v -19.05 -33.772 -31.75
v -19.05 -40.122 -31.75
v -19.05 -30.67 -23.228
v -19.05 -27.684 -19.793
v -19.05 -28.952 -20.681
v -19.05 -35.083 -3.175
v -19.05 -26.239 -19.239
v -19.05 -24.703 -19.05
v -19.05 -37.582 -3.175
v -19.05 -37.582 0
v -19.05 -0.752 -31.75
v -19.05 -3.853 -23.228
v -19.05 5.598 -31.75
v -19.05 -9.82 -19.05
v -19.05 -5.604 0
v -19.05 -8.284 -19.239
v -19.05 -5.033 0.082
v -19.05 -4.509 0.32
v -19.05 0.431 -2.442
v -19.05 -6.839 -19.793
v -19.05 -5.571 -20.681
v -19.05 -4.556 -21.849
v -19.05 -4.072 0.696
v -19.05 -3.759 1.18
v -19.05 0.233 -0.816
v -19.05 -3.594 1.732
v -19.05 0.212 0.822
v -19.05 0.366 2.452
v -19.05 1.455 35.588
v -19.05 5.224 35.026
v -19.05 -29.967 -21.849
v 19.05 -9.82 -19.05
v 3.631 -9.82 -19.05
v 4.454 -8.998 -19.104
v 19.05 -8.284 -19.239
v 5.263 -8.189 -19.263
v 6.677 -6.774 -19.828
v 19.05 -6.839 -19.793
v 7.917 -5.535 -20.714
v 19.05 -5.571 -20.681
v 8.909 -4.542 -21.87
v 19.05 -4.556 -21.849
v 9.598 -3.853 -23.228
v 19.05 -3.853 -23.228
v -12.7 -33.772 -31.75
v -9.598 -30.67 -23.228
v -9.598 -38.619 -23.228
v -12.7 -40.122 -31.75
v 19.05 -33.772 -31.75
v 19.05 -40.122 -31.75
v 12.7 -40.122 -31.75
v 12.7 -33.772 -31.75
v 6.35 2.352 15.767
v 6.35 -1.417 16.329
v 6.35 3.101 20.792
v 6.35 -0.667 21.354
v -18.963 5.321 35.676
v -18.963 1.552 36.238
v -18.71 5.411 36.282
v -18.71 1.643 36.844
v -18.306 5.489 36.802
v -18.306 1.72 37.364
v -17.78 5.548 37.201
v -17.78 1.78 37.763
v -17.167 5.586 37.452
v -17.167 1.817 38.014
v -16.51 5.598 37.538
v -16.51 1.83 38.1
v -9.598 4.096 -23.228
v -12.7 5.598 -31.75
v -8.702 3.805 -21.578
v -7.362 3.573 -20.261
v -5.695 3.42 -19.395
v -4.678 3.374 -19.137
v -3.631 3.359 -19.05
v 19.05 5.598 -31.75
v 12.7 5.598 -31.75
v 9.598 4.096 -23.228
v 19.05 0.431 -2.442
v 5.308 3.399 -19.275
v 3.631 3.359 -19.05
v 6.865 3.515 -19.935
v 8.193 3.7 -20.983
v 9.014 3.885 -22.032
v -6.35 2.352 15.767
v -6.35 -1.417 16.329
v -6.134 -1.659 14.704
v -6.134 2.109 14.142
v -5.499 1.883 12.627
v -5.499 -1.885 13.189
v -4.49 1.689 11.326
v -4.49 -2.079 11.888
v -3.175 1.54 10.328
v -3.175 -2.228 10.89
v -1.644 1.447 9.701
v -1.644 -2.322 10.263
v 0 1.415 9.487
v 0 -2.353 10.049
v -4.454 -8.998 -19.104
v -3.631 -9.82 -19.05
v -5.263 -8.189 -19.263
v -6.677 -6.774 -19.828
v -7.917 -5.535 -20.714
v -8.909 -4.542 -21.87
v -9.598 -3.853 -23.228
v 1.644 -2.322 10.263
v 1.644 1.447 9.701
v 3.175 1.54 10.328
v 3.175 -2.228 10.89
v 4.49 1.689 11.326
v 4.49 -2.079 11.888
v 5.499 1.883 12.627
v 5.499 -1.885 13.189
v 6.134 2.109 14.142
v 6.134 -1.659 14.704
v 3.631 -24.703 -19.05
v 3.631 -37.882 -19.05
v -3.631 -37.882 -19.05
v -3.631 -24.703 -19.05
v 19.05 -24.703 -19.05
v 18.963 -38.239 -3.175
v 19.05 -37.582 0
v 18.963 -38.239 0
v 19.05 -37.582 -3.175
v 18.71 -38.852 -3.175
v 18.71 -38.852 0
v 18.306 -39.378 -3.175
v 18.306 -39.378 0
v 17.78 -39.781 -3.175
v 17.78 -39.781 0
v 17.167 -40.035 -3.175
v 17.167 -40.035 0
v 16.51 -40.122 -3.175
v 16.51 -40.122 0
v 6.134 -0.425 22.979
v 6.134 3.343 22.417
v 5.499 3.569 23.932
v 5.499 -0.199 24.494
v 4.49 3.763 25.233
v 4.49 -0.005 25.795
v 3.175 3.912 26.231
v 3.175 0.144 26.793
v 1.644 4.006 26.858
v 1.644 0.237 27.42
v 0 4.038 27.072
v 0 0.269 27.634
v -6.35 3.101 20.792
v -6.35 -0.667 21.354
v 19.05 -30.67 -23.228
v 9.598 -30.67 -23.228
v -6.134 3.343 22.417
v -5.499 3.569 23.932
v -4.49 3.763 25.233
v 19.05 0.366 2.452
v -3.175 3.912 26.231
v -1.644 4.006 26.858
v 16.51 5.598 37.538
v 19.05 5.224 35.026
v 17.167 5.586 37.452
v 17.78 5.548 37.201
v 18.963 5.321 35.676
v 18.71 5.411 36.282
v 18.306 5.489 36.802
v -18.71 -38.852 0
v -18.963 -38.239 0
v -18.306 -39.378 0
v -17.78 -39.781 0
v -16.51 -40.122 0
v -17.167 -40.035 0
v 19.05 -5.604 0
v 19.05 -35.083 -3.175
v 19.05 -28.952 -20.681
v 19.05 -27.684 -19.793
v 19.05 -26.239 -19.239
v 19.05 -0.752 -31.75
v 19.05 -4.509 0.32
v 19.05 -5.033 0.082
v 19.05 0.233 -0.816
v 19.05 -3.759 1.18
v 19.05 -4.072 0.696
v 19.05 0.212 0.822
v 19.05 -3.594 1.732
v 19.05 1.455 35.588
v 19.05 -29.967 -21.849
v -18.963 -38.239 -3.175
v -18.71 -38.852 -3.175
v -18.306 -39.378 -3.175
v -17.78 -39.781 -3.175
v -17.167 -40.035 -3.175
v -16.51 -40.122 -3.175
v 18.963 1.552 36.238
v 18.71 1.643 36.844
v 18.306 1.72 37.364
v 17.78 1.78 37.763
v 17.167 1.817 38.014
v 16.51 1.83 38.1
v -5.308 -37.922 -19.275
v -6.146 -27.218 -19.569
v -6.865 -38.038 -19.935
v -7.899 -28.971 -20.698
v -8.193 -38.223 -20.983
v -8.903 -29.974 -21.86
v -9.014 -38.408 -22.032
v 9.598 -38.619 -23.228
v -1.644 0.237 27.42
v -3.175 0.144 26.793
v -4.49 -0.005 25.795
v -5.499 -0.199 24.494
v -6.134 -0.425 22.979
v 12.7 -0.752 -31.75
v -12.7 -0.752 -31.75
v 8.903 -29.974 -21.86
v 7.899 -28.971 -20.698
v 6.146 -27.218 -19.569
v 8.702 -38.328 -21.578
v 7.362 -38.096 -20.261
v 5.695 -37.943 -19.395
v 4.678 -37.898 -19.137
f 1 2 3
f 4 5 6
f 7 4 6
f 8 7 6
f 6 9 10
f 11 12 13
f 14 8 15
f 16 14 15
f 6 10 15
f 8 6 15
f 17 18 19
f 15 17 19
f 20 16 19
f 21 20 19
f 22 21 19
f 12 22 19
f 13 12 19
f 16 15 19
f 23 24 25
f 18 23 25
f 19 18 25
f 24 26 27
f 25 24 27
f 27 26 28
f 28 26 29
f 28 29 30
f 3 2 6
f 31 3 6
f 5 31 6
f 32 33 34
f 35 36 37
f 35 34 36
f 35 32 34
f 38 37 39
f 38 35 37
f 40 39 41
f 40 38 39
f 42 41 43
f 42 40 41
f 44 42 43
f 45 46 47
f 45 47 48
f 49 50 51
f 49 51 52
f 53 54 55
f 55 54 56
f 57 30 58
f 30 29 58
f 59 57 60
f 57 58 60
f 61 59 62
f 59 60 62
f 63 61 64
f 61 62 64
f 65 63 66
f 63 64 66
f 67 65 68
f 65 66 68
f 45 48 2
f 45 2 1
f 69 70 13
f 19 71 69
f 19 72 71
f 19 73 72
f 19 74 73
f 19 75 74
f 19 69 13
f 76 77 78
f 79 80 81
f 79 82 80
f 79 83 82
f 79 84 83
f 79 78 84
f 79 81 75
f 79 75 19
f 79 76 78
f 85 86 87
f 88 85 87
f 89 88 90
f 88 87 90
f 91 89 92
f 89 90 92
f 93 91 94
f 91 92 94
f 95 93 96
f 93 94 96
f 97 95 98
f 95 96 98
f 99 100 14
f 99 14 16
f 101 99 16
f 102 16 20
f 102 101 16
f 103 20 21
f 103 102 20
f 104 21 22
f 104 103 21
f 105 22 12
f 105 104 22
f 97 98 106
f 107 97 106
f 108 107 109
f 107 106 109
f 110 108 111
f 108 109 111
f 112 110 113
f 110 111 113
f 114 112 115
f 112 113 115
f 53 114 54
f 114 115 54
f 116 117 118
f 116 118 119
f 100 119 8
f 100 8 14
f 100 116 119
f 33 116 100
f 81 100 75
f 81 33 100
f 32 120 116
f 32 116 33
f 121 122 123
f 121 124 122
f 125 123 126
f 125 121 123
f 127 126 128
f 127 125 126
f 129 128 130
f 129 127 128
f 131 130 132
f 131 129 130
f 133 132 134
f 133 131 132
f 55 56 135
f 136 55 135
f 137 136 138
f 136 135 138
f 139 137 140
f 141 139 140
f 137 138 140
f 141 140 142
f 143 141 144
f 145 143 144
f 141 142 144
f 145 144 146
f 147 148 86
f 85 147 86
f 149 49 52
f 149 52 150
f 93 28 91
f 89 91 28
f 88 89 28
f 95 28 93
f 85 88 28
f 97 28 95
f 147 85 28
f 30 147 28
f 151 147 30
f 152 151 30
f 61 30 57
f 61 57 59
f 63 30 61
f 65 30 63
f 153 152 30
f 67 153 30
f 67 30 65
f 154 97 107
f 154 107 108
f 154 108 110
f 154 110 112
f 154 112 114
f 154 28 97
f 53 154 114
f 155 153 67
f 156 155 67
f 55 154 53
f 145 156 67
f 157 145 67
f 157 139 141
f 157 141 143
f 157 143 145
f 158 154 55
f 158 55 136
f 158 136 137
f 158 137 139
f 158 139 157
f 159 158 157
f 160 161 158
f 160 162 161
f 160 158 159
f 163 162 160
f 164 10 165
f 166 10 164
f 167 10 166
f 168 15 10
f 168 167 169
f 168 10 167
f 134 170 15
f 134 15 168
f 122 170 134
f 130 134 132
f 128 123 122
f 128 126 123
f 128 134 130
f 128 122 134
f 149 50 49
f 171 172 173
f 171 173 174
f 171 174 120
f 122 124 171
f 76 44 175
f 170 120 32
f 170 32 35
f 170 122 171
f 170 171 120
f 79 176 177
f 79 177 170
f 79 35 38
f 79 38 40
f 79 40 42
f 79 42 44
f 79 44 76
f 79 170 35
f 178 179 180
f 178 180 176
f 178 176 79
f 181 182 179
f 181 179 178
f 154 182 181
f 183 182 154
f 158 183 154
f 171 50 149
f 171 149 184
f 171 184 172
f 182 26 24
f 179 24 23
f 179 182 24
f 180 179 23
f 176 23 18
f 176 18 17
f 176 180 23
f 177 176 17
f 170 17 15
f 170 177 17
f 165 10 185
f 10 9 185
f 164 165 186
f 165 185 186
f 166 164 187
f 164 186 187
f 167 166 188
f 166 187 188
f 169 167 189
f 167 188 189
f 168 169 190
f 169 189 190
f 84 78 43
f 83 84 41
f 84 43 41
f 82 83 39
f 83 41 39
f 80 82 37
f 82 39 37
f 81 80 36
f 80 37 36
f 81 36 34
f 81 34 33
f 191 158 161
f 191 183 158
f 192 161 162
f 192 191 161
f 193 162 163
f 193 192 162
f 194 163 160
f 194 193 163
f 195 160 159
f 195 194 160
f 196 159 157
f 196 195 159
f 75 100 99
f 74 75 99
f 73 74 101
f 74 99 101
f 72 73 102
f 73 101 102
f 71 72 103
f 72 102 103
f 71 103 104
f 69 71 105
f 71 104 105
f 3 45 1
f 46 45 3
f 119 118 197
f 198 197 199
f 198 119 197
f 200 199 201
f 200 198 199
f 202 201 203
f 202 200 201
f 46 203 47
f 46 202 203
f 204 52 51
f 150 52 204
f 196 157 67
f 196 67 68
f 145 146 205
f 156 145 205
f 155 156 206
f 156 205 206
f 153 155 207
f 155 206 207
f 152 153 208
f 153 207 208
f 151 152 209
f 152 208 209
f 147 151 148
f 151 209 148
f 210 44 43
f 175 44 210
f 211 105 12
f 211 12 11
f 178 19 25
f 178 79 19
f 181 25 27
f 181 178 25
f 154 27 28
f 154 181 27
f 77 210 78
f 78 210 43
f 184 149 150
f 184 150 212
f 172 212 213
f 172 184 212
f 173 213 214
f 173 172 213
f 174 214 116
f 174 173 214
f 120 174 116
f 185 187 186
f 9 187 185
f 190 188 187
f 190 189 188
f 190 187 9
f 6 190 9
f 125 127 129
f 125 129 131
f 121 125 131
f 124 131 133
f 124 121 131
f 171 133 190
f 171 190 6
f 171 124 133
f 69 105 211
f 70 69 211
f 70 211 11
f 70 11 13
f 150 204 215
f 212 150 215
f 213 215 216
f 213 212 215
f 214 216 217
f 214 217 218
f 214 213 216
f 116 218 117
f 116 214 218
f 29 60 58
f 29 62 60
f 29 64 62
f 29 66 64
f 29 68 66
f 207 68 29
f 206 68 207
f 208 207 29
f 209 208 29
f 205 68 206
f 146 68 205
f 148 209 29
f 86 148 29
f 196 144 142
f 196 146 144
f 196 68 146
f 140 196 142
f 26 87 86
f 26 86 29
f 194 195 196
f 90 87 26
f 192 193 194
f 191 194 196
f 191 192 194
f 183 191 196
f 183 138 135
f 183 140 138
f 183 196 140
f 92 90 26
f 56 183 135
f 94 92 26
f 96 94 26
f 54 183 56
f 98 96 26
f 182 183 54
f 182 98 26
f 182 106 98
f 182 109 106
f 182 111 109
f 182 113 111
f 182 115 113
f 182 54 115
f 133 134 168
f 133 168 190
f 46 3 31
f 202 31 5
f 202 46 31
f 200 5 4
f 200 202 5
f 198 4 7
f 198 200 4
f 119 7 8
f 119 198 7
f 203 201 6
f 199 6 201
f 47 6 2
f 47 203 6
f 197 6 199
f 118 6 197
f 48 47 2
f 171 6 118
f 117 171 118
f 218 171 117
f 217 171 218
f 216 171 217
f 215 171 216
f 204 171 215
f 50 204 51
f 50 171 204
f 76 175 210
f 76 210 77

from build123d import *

# Parameters (mm, degrees)
F1_DEPTH      = 19.05
F3_DEPTH      = 5.5993816375
F3_DEPTH_BACK = 40.1226183625
F5_DEPTH      = 14.0315074599
F6_R          = 2.54


with BuildPart() as f1:
    # F0 (on Right) → F1 (new body, symmetric)
    with BuildSketch(Plane.YZ):
        with BuildLine():
            ThreePointArc((0.4305788672, -2.4419341014), (0.2003852832, 0.0026537646), (0.365760616, 2.4524802728))
            Line((0.365760616, 2.4524802728), (5.5983816375, 37.5379959634))
            Line((5.5983816375, 37.5379959634), (1.8300595357, 38.1))
            Line((1.8300595357, 38.1), (-3.5937905479, 1.7322645138))
            ThreePointArc((-3.5937905479, 1.7322645138), (-4.276919676, 0.4928303362), (-5.6035623355, 0))
            Line((-5.6035623355, 0), (-40.1216183625, 0))
            Line((-40.1216183625, 0), (-40.1216183625, -3.175))
            Line((-40.1216183625, -3.175), (-35.0830748888, -3.175))
            Line((-35.0830748888, -3.175), (-40.1216183625, -31.75))
            Line((-40.1216183625, -31.75), (-33.7716183625, -31.75))
            Line((-33.7716183625, -31.75), (-30.6699266617, -23.2281720899))
            ThreePointArc((-30.6699266617, -23.2281720899), (-28.3450888905, -20.1983845188), (-24.7028785197, -19.05))
            Line((-24.7028785197, -19.05), (-9.8203582053, -19.05))
            ThreePointArc((-9.8203582053, -19.05), (-6.1781478345, -20.1983845188), (-3.8533100633, -23.2281720899))
            Line((-3.8533100633, -23.2281720899), (-0.7516183625, -31.75))
            Line((-0.7516183625, -31.75), (5.5983816375, -31.75))
            Line((5.5983816375, -31.75), (0.4305788672, -2.4419341014))
        make_face()
    extrude(amount=F1_DEPTH, both=True)

    # F2 (on Front) → F3 (cut, two sides)
    with BuildSketch(Plane.XZ) as f3_sk:
        with BuildLine():
            Line((-9.5983082992, -23.2281720899), (-12.7, -31.75))
            Line((-12.7, -31.75), (0, -31.75))
            Line((0, -31.75), (12.7, -31.75))
            Line((12.7, -31.75), (9.5983082992, -23.2281720899))
            ThreePointArc((9.5983082992, -23.2281720899), (7.273470528, -20.1983845188), (3.6312601572, -19.05))
            Line((3.6312601572, -19.05), (0, -19.05))
            Line((0, -19.05), (-3.6312601572, -19.05))
            ThreePointArc((-3.6312601572, -19.05), (-7.273470528, -20.1983845188), (-9.5983082992, -23.2281720899))
        make_face()
    extrude(amount=-F3_DEPTH, mode=Mode.SUBTRACT)
    extrude(f3_sk.sketch, amount=F3_DEPTH_BACK, mode=Mode.SUBTRACT)

    # F4 (on face) → F5 (cut, through all)
    with BuildSketch(Plane(origin=(0, -3.7683221018, 0.5620040366), x_dir=(1, 0, 0), z_dir=(0, -0.9890609191, 0.1475076212))):
        with BuildLine():
            ThreePointArc((0, 27.3717801606), (-4.4901280605, 25.5119082211), (-6.35, 21.0217801606))
            Line((-6.35, 21.0217801606), (-6.35, 15.9417801606))
            ThreePointArc((-6.35, 15.9417801606), (-4.4901280605, 11.4516521), (0, 9.5917801606))
            ThreePointArc((0, 9.5917801606), (4.4901280605, 11.4516521), (6.35, 15.9417801606))
            Line((6.35, 15.9417801606), (6.35, 21.0217801606))
            ThreePointArc((6.35, 21.0217801606), (4.4901280605, 25.5119082211), (0, 27.3717801606))
        make_face()
    extrude(amount=-F5_DEPTH, mode=Mode.SUBTRACT)

    # F6
    f6_edges = [f1.edges().sort_by_distance(p)[0] for p in [
        (19.05, 3.714221, 37.818998),
        (-19.05, 3.714221, 37.818998),
        (-19.05, -40.121618, -1.5875),
        (19.05, -40.121618, -1.5875),
    ]]
    fillet(f6_edges, radius=F6_R)


solid = f1.part
